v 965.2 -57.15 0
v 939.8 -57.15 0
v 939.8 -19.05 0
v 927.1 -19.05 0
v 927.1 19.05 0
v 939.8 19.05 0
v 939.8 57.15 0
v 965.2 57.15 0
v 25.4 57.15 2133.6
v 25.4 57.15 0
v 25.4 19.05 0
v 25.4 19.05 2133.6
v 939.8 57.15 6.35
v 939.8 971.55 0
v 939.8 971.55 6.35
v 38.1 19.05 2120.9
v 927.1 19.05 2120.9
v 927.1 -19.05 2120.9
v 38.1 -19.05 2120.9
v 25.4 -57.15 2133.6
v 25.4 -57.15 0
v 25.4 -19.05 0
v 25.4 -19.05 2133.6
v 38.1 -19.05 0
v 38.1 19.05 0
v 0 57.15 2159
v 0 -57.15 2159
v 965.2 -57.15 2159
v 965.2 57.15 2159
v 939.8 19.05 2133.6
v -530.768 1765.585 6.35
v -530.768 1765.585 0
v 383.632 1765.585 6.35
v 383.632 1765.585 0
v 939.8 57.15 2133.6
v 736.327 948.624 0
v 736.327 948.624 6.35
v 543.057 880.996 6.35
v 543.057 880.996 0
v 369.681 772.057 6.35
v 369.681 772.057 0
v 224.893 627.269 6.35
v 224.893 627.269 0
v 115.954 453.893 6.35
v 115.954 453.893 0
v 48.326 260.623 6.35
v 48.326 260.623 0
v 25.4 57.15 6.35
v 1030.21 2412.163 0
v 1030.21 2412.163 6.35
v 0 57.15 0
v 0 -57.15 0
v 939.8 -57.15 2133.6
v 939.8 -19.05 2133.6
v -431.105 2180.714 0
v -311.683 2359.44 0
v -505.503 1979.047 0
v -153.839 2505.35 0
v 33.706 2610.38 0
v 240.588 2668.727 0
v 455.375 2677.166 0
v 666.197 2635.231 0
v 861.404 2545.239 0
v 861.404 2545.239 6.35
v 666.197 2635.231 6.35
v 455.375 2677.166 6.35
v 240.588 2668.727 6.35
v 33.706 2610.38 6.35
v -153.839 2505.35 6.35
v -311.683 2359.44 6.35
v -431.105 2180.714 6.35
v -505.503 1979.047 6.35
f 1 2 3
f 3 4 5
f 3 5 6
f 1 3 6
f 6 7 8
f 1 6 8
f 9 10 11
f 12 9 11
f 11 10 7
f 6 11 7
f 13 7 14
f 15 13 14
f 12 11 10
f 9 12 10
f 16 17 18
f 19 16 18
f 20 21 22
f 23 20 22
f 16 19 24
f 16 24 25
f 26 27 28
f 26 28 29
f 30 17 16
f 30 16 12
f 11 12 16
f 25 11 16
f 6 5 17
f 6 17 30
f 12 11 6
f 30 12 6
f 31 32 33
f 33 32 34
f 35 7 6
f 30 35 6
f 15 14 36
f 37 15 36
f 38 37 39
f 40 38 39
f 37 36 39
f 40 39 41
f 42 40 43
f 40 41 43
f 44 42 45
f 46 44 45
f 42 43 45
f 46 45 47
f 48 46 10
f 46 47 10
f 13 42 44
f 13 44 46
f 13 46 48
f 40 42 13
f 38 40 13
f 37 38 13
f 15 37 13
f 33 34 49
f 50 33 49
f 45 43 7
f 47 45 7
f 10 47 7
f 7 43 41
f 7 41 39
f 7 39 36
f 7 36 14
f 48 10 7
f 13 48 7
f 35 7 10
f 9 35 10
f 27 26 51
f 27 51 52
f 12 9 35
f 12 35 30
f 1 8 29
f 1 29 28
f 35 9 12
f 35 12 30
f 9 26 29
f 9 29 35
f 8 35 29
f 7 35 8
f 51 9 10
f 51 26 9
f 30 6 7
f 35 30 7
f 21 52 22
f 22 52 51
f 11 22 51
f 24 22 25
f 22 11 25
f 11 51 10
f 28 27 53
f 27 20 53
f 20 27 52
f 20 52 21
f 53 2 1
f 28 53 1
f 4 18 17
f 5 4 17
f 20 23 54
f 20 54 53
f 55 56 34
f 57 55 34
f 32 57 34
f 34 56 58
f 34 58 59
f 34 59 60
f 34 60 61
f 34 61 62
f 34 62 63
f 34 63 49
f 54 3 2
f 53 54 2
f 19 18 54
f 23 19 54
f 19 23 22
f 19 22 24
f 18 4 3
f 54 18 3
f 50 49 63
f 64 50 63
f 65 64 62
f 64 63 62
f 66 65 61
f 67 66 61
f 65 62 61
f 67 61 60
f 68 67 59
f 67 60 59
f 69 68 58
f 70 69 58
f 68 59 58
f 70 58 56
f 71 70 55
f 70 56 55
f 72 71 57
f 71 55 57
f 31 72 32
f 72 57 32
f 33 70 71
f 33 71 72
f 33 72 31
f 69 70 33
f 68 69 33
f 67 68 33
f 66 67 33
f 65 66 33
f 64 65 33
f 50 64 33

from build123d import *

# Parameters (mm, degrees)
F0_W     = 12.7
F0_H     = 38.1
F1_DEPTH = 2133.6
F2_W     = 38.1
F2_H     = 12.7
F3_DEPTH = 965.2
F4_DEPTH = 2133.6
F5_DEPTH = 6.35


with BuildPart() as f1:
    # F0 (on Top) → F1 (new body)
    with BuildSketch(Plane.XY):
        Polygon((25.4, 19.05), (25.4, 57.15), (0, 57.15), (0, -57.15), (25.4, -57.15), (25.4, -19.05), align=None)
        with Locations((31.75, 0)):
            Rectangle(F0_W, F0_H)
        Polygon((965.2, 57.15), (939.8, 57.15), (939.8, 19.05), (939.8, -19.05), (939.8, -57.15), (965.2, -57.15), align=None)
        with Locations((933.45, 0)):
            Rectangle(F0_W, F0_H)
    extrude(amount=F1_DEPTH)

    # F2 (on face) → F3 (join)
    with BuildSketch(Plane(origin=(0, 0, 0), x_dir=(0, -1, 0), z_dir=(-1, 0, 0))):
        with Locations((0, 2127.25)):
            Rectangle(F2_W, F2_H)
        Polygon((57.15, 2159), (-57.15, 2159), (-57.15, 2133.6), (-19.05, 2133.6), (19.05, 2133.6), (57.15, 2133.6), align=None)
    extrude(amount=-F3_DEPTH)


with BuildPart() as f4:
    # F0 (on Top) → F4 (new body)
    with BuildSketch(Plane.XY):
        Polygon((939.8, 19.05), (939.8, 57.15), (25.4, 57.15), (25.4, 19.05), (38.1, 19.05), (927.1, 19.05), align=None)
    extrude(amount=F4_DEPTH)


with BuildPart() as f5:
    # F0 (on Top) → F5 (new body)
    with BuildSketch(Plane.XY):
        with BuildLine():
            Line((25.4, 57.15), (939.8, 57.15))
            Line((939.8, 57.15), (939.8, 971.55))
            ThreePointArc((939.8, 971.55), (293.221559, 703.728441), (25.4, 57.15))
        make_face()
        with BuildLine():
            ThreePointArc((1030.210208, 2412.163187), (33.706037, 2610.380191), (-530.768232, 1765.584746))
            Line((-530.768232, 1765.584746), (383.631768, 1765.584746))
            Line((383.631768, 1765.584746), (1030.210208, 2412.163187))
        make_face()
    extrude(amount=F5_DEPTH)


solid = Compound([f1.part, f4.part, f5.part])
